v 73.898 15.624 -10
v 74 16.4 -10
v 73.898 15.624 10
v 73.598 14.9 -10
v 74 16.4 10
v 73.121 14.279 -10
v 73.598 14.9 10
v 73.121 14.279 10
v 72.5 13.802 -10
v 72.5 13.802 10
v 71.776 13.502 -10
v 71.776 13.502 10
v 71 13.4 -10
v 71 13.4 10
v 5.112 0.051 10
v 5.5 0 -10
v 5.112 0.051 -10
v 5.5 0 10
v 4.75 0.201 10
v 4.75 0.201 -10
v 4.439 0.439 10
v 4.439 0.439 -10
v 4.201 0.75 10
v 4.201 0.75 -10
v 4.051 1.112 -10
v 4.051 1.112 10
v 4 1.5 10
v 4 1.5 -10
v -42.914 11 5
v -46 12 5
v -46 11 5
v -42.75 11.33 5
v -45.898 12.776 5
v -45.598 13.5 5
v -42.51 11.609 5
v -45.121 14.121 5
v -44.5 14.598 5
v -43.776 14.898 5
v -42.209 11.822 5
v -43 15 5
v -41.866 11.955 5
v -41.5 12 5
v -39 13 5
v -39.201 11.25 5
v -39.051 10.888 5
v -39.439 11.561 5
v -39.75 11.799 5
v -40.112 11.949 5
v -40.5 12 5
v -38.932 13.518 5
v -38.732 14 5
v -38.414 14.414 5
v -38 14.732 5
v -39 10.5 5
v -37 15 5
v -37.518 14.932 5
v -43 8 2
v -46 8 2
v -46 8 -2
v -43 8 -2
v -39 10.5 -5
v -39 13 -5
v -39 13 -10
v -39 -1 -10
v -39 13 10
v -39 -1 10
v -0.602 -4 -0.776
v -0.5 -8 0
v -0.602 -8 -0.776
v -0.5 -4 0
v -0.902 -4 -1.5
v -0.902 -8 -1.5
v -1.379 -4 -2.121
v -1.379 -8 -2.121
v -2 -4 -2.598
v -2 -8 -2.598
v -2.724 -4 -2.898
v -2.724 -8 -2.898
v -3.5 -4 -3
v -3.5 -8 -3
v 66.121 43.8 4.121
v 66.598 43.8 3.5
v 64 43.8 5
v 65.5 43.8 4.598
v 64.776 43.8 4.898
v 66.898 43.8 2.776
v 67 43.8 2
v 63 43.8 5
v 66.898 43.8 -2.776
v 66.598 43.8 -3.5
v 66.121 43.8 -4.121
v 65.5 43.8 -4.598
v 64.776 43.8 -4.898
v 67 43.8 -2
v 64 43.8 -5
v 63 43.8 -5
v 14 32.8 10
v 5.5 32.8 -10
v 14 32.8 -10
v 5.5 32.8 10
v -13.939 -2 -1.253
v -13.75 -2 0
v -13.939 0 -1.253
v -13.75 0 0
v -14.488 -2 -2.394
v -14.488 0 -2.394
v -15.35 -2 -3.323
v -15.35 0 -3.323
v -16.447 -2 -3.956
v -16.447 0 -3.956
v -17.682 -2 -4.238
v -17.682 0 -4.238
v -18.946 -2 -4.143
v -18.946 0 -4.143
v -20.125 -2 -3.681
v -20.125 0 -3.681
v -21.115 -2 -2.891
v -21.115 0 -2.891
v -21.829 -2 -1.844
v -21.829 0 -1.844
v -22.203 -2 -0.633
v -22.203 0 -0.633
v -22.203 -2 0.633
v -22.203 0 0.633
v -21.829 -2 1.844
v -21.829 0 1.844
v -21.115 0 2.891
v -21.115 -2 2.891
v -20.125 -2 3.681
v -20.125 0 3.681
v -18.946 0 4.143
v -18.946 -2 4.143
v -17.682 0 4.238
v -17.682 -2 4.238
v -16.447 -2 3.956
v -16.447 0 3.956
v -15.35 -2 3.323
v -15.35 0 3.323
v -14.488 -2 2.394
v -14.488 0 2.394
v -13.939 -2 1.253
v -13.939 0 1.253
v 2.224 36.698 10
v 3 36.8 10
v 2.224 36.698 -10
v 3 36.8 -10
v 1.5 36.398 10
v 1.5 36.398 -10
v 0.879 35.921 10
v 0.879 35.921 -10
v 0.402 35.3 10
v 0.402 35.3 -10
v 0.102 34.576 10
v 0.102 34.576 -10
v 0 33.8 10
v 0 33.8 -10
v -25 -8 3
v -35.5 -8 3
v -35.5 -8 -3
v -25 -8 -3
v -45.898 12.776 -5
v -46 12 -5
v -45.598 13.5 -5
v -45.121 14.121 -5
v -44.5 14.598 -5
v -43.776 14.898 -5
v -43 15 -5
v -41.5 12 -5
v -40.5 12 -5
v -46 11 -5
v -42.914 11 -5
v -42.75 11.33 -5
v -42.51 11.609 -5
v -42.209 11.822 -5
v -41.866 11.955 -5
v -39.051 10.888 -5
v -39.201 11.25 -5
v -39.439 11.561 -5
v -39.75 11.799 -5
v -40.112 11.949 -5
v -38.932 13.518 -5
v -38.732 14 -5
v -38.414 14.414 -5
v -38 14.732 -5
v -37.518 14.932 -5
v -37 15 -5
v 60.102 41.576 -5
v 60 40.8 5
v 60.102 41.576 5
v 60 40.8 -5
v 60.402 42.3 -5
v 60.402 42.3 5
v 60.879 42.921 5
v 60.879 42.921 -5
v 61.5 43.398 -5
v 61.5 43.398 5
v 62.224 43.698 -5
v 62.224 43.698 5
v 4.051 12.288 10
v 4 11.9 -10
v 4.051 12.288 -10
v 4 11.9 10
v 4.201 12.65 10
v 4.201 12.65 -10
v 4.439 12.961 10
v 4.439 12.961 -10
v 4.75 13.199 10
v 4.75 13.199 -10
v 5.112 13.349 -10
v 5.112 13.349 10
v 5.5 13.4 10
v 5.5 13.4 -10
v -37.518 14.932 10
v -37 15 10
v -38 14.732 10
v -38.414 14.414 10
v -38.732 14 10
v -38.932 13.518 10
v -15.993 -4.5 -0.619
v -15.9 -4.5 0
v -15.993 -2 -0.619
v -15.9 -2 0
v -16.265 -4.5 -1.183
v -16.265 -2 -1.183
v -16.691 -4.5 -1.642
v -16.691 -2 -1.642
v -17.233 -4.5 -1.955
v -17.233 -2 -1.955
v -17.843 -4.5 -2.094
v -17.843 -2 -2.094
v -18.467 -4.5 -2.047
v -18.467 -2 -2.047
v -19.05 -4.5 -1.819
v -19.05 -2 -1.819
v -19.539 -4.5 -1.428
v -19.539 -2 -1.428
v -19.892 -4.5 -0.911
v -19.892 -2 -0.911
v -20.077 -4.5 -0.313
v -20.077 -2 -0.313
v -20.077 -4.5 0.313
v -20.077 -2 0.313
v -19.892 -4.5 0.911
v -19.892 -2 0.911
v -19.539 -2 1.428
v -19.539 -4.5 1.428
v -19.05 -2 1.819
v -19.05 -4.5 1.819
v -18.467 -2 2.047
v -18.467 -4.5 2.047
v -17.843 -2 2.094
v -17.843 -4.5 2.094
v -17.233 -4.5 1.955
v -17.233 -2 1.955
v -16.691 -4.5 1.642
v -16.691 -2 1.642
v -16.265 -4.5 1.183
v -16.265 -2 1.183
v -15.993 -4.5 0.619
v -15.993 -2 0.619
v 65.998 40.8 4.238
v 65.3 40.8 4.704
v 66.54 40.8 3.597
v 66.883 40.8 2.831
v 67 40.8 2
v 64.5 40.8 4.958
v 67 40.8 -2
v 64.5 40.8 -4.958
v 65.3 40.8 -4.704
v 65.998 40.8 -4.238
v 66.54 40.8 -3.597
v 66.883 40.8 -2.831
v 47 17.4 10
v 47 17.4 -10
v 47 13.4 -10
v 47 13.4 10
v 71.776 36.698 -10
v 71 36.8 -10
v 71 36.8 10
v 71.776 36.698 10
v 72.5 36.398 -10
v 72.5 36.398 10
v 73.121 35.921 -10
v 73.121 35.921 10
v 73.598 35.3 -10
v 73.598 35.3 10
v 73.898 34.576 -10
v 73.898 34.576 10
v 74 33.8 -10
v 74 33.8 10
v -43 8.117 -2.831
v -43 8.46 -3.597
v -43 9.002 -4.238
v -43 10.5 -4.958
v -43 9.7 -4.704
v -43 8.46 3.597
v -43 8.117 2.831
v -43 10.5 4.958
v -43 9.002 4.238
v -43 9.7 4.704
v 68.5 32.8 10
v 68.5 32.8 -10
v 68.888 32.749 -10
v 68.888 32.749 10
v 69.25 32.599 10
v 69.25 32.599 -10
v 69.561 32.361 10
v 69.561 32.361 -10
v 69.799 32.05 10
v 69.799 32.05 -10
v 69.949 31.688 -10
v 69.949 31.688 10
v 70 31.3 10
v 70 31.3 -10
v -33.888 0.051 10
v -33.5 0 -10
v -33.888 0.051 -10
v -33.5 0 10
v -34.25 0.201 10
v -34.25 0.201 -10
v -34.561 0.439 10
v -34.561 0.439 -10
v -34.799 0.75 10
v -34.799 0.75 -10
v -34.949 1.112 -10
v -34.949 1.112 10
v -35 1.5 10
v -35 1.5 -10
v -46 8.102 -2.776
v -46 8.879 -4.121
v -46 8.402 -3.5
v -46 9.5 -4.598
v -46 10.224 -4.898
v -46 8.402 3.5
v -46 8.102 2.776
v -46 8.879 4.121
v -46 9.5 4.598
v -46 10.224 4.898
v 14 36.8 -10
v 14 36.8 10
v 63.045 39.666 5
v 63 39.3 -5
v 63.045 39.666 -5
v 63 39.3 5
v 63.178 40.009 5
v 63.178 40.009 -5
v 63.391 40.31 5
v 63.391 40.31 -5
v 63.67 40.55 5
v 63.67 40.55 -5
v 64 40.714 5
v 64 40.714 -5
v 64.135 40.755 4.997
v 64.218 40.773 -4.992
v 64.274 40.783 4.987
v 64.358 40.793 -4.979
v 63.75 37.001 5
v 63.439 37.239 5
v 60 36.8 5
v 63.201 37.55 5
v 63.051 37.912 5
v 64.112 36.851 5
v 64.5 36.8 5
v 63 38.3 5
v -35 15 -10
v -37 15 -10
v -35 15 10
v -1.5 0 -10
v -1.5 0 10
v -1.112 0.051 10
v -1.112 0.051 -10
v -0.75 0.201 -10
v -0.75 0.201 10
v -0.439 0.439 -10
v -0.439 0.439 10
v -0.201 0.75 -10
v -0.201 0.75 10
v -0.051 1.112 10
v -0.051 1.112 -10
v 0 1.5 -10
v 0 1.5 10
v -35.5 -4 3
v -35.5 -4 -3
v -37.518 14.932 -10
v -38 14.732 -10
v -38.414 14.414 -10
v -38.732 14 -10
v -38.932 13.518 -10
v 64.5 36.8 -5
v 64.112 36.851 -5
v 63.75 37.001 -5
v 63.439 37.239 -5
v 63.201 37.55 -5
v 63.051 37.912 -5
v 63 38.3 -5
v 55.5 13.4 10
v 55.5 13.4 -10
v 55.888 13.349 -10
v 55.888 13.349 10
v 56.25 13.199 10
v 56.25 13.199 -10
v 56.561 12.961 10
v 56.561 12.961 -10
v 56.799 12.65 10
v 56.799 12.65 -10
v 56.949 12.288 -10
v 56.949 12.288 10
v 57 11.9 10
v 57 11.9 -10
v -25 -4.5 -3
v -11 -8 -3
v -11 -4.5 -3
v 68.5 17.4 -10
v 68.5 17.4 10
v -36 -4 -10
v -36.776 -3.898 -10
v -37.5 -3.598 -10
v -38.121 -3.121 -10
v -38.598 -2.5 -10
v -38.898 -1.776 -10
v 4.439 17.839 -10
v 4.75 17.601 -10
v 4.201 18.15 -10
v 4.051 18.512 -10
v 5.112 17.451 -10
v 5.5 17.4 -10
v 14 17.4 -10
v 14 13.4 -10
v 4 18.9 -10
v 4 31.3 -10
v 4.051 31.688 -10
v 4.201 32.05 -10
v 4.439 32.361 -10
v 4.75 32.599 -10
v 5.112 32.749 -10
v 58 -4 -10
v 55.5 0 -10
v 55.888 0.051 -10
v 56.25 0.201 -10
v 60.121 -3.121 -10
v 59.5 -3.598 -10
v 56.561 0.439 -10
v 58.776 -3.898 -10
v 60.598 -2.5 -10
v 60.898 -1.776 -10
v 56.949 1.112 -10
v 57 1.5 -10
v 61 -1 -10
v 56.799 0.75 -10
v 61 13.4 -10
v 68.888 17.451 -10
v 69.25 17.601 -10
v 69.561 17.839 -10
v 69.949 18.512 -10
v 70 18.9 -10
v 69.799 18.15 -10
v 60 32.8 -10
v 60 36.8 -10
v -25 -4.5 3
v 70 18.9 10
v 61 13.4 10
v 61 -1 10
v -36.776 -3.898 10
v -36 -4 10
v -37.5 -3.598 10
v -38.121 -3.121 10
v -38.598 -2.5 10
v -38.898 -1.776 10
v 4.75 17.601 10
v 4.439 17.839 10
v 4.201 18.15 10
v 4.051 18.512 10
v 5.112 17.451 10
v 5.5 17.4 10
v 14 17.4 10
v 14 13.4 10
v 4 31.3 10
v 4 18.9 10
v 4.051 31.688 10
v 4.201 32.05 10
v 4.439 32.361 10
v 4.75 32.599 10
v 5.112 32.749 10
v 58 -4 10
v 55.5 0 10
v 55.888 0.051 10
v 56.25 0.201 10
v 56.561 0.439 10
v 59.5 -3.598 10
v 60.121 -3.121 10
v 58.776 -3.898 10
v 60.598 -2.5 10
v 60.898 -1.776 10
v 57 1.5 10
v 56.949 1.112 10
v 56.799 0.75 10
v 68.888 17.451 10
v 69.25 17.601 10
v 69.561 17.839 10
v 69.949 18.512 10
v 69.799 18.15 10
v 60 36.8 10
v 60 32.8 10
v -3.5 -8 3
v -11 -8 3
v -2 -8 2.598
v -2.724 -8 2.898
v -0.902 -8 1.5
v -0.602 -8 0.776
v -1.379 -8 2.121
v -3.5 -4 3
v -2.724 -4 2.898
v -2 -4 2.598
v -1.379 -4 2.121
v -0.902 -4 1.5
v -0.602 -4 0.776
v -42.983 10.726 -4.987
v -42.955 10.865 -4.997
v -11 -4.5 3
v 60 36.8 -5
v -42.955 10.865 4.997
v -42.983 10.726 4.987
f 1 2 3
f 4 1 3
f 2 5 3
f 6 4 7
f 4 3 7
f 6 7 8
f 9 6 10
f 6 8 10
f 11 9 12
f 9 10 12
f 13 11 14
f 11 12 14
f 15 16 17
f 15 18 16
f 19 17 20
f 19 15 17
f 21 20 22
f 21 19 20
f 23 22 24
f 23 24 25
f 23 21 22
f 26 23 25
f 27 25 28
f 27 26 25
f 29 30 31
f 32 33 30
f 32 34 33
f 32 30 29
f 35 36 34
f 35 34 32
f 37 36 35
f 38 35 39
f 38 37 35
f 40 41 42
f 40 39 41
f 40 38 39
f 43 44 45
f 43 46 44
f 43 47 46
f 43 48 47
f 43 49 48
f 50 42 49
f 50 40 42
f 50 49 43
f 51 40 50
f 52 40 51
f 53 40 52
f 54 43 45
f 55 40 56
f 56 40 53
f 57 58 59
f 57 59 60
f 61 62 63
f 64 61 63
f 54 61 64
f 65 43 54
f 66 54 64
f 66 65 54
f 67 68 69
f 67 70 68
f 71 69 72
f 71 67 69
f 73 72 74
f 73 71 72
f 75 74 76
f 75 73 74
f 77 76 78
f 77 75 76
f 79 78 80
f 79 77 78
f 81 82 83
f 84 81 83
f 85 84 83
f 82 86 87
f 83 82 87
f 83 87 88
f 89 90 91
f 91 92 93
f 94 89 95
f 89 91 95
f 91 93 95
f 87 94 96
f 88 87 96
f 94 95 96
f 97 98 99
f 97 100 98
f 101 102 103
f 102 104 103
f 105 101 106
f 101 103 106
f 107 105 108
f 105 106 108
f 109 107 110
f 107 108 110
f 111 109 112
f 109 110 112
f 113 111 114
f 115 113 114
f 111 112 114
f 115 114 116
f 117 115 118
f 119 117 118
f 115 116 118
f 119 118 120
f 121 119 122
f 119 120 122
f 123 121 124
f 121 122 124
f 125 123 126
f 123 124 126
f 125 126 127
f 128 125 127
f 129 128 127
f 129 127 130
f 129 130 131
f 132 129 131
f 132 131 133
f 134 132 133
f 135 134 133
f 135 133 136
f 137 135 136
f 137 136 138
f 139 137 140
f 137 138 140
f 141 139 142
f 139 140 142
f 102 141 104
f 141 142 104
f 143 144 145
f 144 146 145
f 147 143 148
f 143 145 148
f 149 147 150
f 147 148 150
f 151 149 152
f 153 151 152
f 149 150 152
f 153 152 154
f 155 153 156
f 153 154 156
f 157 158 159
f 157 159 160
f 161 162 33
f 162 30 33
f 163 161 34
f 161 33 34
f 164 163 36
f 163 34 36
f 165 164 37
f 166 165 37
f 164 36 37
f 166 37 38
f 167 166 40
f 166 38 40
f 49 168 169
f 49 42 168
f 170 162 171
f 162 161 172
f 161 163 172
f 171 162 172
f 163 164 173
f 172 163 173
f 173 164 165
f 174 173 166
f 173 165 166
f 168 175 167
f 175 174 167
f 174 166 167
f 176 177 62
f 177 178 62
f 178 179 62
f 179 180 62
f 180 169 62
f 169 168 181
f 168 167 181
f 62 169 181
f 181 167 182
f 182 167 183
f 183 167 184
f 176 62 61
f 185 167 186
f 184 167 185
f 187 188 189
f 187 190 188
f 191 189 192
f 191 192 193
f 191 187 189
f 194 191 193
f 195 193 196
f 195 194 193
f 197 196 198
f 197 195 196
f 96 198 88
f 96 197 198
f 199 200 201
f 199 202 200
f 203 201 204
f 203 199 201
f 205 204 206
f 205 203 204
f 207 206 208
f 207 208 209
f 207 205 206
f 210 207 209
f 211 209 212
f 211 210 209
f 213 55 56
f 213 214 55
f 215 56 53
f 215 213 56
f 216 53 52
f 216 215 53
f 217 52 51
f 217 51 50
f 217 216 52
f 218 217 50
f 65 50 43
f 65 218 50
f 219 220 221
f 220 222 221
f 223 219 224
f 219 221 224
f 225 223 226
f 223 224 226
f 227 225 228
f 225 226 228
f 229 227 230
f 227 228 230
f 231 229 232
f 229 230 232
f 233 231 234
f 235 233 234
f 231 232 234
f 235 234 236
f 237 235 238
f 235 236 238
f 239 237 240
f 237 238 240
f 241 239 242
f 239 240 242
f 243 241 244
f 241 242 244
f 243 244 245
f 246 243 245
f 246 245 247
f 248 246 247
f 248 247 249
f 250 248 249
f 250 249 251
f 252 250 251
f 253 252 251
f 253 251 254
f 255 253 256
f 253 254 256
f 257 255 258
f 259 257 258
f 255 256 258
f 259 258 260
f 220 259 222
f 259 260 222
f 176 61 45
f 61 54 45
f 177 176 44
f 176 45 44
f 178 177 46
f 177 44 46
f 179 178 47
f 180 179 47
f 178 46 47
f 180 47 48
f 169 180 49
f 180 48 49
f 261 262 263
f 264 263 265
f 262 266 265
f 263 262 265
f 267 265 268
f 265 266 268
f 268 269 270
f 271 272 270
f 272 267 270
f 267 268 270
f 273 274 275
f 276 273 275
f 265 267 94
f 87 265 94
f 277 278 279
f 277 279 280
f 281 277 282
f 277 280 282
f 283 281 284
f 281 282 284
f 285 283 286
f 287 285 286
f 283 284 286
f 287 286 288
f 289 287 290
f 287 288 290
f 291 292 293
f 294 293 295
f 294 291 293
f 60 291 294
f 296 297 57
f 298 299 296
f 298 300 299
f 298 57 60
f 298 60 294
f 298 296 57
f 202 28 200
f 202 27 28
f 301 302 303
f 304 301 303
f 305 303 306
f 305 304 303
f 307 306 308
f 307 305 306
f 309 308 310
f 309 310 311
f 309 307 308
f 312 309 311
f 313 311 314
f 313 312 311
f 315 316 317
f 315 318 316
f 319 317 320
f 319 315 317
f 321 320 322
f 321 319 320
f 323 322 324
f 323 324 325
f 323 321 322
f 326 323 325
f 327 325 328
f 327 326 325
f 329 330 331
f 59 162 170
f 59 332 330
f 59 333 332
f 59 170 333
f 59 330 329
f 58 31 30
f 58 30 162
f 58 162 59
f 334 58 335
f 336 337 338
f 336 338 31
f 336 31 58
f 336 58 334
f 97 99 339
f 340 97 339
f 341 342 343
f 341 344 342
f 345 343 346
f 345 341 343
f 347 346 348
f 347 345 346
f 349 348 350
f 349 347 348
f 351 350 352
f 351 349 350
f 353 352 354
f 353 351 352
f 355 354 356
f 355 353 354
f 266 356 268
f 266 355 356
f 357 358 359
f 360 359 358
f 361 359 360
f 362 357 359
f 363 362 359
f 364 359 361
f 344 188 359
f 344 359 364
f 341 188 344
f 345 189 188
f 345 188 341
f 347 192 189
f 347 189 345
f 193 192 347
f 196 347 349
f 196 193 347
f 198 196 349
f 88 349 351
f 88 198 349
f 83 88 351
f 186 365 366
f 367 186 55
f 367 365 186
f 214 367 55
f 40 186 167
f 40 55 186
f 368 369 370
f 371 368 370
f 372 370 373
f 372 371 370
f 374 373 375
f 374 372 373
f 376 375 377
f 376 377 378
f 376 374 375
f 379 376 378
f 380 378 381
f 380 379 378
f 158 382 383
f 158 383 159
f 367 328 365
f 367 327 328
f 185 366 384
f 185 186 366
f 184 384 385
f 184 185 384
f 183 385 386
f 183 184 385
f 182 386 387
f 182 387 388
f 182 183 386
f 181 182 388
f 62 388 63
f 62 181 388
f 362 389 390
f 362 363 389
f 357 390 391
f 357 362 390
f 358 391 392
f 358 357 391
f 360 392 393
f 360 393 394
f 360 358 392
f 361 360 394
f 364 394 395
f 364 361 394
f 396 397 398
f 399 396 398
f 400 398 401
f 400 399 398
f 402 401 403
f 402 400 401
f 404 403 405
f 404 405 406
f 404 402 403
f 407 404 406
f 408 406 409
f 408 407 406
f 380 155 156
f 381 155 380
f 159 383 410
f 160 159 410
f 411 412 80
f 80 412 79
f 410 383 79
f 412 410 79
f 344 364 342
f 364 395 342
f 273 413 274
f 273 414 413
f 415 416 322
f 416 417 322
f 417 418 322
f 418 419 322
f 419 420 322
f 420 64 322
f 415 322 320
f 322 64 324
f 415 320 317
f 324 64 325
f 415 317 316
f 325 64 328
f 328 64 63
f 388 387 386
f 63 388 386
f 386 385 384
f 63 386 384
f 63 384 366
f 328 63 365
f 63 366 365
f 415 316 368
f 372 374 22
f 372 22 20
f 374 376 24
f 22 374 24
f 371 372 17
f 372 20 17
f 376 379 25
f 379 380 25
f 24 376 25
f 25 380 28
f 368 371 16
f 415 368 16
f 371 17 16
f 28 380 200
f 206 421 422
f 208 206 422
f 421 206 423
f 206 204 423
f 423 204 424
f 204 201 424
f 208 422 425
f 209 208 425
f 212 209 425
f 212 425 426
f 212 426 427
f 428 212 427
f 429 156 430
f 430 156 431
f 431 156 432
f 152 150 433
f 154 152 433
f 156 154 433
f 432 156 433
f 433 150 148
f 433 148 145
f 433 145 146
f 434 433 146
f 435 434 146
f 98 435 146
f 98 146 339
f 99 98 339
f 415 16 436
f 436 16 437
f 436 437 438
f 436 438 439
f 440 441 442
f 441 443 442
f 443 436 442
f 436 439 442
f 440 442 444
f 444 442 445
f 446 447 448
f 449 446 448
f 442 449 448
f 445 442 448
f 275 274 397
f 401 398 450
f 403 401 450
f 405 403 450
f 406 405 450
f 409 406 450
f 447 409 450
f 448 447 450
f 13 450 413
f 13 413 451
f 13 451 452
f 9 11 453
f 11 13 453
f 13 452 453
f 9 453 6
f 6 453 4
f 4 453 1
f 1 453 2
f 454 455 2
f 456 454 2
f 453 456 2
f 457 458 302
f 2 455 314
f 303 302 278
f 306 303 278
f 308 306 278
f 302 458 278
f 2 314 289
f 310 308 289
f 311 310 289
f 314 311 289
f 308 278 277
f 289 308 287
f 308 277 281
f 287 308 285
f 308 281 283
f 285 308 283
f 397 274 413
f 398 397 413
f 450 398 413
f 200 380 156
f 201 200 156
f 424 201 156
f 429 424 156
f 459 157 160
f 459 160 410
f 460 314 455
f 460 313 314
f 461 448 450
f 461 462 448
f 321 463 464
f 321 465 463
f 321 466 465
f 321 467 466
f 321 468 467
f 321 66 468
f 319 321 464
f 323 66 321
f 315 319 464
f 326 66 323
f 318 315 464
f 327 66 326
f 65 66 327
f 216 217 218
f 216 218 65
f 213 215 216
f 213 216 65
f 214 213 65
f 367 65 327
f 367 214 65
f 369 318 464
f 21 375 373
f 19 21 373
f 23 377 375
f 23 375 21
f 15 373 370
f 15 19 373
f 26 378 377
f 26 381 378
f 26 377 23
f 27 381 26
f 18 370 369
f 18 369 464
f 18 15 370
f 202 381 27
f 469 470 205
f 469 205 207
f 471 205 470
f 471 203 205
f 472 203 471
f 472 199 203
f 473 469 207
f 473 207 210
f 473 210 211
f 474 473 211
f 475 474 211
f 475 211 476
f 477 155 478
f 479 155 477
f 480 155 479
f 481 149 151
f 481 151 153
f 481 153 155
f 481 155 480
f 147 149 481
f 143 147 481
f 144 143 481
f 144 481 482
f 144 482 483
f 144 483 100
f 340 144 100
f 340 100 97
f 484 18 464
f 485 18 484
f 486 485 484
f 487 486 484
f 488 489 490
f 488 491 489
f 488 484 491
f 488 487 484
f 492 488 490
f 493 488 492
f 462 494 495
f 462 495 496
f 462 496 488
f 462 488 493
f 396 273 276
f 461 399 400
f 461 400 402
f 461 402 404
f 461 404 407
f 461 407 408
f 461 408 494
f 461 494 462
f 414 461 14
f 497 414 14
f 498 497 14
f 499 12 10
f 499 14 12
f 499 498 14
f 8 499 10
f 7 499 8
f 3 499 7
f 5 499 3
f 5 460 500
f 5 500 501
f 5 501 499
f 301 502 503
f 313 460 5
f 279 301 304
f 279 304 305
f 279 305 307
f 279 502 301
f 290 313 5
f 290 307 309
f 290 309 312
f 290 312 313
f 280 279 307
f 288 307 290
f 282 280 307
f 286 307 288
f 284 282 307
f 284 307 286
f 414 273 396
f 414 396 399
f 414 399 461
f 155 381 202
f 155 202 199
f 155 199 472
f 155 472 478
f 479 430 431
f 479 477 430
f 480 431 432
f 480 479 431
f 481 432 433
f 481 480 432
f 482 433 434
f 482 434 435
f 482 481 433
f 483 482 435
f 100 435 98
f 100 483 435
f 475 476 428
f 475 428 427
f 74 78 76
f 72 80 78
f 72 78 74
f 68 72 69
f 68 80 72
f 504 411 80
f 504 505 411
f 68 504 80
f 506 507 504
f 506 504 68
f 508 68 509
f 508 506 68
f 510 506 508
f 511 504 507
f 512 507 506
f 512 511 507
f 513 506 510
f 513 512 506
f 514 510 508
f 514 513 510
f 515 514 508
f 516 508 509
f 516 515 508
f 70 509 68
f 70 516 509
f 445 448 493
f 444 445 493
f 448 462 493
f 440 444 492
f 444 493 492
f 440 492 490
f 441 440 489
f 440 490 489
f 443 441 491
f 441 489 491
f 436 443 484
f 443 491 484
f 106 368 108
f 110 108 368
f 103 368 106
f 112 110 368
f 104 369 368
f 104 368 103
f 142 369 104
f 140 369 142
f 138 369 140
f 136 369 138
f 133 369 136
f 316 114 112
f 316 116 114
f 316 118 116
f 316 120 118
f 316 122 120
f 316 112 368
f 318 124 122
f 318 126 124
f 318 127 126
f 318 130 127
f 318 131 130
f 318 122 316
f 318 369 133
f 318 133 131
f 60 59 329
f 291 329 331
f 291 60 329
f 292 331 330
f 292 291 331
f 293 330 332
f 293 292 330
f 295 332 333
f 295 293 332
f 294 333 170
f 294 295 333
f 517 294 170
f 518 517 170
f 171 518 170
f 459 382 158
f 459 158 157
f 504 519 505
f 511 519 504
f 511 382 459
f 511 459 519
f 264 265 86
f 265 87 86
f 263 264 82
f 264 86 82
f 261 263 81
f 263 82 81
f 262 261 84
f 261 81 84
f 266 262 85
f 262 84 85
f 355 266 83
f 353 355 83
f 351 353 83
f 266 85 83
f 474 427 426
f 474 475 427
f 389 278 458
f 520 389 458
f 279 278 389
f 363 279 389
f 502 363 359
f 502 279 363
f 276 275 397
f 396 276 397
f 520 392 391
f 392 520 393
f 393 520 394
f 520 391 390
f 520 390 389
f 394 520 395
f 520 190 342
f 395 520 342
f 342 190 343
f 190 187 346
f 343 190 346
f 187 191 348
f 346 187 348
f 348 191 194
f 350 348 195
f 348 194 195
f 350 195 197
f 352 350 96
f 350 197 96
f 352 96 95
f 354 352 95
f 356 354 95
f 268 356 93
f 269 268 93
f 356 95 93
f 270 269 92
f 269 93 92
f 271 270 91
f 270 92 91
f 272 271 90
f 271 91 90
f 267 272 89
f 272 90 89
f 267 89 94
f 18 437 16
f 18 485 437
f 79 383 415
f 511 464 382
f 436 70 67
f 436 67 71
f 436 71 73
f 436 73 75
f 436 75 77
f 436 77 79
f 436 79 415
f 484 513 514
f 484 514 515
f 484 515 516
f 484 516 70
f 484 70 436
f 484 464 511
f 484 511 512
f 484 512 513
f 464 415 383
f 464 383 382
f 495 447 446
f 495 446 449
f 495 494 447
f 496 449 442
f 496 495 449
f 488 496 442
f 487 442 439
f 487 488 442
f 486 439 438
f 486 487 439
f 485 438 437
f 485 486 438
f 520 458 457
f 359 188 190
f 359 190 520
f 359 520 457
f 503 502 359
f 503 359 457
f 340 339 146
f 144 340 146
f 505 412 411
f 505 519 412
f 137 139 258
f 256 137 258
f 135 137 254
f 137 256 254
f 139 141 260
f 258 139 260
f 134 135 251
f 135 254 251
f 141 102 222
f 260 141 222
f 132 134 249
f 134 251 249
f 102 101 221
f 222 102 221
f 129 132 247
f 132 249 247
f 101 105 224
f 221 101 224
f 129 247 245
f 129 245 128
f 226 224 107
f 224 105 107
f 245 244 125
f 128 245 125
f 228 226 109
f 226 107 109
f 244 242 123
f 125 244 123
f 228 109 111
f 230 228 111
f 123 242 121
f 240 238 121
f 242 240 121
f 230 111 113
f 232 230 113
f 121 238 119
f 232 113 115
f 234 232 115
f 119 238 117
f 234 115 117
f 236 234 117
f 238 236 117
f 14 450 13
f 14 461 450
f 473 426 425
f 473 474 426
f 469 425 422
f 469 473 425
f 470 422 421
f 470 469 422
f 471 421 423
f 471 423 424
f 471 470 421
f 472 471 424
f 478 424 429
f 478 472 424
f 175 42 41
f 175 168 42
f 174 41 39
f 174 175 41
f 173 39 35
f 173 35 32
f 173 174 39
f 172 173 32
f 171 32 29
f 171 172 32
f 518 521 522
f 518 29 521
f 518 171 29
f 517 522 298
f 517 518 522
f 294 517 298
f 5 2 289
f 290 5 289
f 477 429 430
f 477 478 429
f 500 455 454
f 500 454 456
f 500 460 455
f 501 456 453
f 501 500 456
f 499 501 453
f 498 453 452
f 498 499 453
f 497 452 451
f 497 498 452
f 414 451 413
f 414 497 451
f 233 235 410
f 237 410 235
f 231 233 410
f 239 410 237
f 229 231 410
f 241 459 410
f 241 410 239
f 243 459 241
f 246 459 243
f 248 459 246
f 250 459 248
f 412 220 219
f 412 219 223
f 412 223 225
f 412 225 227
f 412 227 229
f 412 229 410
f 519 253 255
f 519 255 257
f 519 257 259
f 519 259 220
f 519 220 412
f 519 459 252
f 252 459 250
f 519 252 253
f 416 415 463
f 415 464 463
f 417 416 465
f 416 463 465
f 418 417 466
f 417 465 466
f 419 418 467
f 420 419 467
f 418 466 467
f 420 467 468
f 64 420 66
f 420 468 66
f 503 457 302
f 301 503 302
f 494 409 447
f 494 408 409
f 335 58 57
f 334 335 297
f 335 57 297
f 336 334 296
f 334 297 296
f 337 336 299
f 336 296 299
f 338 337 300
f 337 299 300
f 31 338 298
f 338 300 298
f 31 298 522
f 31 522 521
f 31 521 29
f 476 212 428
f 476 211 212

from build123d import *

# Parameters (mm, degrees)
F1_DEPTH = 10
F3_DEPTH = 5
F4_R     = 1.5
F5_R     = 3
F7_DEPTH = 3
F10_R    = 2
F11_R    = 2.99999


# Not quite as in the source:
# - a fillet or chamfer is up to 0.001 mm smaller than in the source, because OpenCascade refuses the exact size


with BuildPart() as f1:
    # F0 (on Top) → F1 (new body, symmetric)
    with BuildSketch(Plane.XY):
        Polygon((0, 0), (-35, 0), (-35, 15), (-39, 15), (-39, -4), (61, -4), (61, 13.4), (74, 13.4), (74, 36.8), (60, 36.8), (60, 32.8), (70, 32.8), (70, 17.4), (47, 17.4), (47, 13.4), (57, 13.4), (57, 0), (4, 0), (4, 13.4), (14, 13.4), (14, 17.4), (4, 17.4), (4, 32.8), (14, 32.8), (14, 36.8), (0, 36.8), align=None)
    extrude(amount=F1_DEPTH, both=True)

    # F2 (on Top) → F3 (join, symmetric)
    with BuildSketch(Plane.XY):
        Polygon((60, 43.8), (60, 36.8), (63, 36.8), (63, 40.8), (67, 40.8), (67, 43.8), align=None)
        Polygon((-43, 12), (-39, 12), (-39, 15), (-46, 15), (-46, 8), (-43, 8), align=None)
    extrude(amount=F3_DEPTH, both=True)

    # F4
    f4_edges = [f1.edges().sort_by_distance(p)[0] for p in [
        (-35, 0, 0),
        (4, 0, 0),
        (4, 17.4, 0),
        (63, 36.8, 0),
        (63, 40.8, 0),
        (4, 32.8, 0),
        (4, 13.4, 0),
        (70, 17.4, 0),
        (57, 0, 0),
        (70, 32.8, 0),
        (57, 13.4, 0),
        (-39, 12, 0),
        (-43, 12, 0),
        (0, 0, 0),
    ]]
    fillet(f4_edges, radius=F4_R)

    # F5
    f5_edges = [f1.edges().sort_by_distance(p)[0] for p in [
        (-39, -4, 0),
        (61, -4, 0),
        (74, 13.4, 0),
        (74, 36.8, 0),
        (60, 43.8, 0),
        (-46, 15, 0),
        (0, 36.8, 0),
        (-44.5, 8, 5),
        (67, 42.3, 5),
        (-44.5, 8, -5),
        (67, 42.3, -5),
    ]]
    fillet(f5_edges, radius=F5_R)

    # F6 (on Top) → F7 (join, symmetric)
    with BuildSketch(Plane.XY):
        Polygon((-11, -8), (-0.5, -8), (-0.5, -4), (-35.5, -4), (-35.5, -8), (-25, -8), (-25, -4.5), (-11, -4.5), align=None)
    extrude(amount=F7_DEPTH, both=True)

    # F8 (on Top) → F9 (revolve, cut)
    with BuildSketch(Plane.XY):
        Polygon((-18, -4.5), (-15.9, -4.5), (-15.9, -2), (-13.75, -2), (-13.75, 0), (-18, 0), align=None)
    revolve(axis=Axis((-18, 1.7481091395, 0), (0, 1, 0)), mode=Mode.SUBTRACT)

    # F10
    f10_edges = [f1.edges().sort_by_distance(p)[0] for p in [
        (-39, 15, -7.5),
        (-39, 15, 7.5),
    ]]
    fillet(f10_edges, radius=F10_R)

    # F11 (radius 3 in the source; OpenCascade refuses exactly that, so slightly less here)
    f11_edges = [f1.edges().sort_by_distance(p)[0] for p in [
        (-0.5, -6, -3),
        (-0.5, -6, 3),
    ]]
    fillet(f11_edges, radius=F11_R)


solid = f1.part
